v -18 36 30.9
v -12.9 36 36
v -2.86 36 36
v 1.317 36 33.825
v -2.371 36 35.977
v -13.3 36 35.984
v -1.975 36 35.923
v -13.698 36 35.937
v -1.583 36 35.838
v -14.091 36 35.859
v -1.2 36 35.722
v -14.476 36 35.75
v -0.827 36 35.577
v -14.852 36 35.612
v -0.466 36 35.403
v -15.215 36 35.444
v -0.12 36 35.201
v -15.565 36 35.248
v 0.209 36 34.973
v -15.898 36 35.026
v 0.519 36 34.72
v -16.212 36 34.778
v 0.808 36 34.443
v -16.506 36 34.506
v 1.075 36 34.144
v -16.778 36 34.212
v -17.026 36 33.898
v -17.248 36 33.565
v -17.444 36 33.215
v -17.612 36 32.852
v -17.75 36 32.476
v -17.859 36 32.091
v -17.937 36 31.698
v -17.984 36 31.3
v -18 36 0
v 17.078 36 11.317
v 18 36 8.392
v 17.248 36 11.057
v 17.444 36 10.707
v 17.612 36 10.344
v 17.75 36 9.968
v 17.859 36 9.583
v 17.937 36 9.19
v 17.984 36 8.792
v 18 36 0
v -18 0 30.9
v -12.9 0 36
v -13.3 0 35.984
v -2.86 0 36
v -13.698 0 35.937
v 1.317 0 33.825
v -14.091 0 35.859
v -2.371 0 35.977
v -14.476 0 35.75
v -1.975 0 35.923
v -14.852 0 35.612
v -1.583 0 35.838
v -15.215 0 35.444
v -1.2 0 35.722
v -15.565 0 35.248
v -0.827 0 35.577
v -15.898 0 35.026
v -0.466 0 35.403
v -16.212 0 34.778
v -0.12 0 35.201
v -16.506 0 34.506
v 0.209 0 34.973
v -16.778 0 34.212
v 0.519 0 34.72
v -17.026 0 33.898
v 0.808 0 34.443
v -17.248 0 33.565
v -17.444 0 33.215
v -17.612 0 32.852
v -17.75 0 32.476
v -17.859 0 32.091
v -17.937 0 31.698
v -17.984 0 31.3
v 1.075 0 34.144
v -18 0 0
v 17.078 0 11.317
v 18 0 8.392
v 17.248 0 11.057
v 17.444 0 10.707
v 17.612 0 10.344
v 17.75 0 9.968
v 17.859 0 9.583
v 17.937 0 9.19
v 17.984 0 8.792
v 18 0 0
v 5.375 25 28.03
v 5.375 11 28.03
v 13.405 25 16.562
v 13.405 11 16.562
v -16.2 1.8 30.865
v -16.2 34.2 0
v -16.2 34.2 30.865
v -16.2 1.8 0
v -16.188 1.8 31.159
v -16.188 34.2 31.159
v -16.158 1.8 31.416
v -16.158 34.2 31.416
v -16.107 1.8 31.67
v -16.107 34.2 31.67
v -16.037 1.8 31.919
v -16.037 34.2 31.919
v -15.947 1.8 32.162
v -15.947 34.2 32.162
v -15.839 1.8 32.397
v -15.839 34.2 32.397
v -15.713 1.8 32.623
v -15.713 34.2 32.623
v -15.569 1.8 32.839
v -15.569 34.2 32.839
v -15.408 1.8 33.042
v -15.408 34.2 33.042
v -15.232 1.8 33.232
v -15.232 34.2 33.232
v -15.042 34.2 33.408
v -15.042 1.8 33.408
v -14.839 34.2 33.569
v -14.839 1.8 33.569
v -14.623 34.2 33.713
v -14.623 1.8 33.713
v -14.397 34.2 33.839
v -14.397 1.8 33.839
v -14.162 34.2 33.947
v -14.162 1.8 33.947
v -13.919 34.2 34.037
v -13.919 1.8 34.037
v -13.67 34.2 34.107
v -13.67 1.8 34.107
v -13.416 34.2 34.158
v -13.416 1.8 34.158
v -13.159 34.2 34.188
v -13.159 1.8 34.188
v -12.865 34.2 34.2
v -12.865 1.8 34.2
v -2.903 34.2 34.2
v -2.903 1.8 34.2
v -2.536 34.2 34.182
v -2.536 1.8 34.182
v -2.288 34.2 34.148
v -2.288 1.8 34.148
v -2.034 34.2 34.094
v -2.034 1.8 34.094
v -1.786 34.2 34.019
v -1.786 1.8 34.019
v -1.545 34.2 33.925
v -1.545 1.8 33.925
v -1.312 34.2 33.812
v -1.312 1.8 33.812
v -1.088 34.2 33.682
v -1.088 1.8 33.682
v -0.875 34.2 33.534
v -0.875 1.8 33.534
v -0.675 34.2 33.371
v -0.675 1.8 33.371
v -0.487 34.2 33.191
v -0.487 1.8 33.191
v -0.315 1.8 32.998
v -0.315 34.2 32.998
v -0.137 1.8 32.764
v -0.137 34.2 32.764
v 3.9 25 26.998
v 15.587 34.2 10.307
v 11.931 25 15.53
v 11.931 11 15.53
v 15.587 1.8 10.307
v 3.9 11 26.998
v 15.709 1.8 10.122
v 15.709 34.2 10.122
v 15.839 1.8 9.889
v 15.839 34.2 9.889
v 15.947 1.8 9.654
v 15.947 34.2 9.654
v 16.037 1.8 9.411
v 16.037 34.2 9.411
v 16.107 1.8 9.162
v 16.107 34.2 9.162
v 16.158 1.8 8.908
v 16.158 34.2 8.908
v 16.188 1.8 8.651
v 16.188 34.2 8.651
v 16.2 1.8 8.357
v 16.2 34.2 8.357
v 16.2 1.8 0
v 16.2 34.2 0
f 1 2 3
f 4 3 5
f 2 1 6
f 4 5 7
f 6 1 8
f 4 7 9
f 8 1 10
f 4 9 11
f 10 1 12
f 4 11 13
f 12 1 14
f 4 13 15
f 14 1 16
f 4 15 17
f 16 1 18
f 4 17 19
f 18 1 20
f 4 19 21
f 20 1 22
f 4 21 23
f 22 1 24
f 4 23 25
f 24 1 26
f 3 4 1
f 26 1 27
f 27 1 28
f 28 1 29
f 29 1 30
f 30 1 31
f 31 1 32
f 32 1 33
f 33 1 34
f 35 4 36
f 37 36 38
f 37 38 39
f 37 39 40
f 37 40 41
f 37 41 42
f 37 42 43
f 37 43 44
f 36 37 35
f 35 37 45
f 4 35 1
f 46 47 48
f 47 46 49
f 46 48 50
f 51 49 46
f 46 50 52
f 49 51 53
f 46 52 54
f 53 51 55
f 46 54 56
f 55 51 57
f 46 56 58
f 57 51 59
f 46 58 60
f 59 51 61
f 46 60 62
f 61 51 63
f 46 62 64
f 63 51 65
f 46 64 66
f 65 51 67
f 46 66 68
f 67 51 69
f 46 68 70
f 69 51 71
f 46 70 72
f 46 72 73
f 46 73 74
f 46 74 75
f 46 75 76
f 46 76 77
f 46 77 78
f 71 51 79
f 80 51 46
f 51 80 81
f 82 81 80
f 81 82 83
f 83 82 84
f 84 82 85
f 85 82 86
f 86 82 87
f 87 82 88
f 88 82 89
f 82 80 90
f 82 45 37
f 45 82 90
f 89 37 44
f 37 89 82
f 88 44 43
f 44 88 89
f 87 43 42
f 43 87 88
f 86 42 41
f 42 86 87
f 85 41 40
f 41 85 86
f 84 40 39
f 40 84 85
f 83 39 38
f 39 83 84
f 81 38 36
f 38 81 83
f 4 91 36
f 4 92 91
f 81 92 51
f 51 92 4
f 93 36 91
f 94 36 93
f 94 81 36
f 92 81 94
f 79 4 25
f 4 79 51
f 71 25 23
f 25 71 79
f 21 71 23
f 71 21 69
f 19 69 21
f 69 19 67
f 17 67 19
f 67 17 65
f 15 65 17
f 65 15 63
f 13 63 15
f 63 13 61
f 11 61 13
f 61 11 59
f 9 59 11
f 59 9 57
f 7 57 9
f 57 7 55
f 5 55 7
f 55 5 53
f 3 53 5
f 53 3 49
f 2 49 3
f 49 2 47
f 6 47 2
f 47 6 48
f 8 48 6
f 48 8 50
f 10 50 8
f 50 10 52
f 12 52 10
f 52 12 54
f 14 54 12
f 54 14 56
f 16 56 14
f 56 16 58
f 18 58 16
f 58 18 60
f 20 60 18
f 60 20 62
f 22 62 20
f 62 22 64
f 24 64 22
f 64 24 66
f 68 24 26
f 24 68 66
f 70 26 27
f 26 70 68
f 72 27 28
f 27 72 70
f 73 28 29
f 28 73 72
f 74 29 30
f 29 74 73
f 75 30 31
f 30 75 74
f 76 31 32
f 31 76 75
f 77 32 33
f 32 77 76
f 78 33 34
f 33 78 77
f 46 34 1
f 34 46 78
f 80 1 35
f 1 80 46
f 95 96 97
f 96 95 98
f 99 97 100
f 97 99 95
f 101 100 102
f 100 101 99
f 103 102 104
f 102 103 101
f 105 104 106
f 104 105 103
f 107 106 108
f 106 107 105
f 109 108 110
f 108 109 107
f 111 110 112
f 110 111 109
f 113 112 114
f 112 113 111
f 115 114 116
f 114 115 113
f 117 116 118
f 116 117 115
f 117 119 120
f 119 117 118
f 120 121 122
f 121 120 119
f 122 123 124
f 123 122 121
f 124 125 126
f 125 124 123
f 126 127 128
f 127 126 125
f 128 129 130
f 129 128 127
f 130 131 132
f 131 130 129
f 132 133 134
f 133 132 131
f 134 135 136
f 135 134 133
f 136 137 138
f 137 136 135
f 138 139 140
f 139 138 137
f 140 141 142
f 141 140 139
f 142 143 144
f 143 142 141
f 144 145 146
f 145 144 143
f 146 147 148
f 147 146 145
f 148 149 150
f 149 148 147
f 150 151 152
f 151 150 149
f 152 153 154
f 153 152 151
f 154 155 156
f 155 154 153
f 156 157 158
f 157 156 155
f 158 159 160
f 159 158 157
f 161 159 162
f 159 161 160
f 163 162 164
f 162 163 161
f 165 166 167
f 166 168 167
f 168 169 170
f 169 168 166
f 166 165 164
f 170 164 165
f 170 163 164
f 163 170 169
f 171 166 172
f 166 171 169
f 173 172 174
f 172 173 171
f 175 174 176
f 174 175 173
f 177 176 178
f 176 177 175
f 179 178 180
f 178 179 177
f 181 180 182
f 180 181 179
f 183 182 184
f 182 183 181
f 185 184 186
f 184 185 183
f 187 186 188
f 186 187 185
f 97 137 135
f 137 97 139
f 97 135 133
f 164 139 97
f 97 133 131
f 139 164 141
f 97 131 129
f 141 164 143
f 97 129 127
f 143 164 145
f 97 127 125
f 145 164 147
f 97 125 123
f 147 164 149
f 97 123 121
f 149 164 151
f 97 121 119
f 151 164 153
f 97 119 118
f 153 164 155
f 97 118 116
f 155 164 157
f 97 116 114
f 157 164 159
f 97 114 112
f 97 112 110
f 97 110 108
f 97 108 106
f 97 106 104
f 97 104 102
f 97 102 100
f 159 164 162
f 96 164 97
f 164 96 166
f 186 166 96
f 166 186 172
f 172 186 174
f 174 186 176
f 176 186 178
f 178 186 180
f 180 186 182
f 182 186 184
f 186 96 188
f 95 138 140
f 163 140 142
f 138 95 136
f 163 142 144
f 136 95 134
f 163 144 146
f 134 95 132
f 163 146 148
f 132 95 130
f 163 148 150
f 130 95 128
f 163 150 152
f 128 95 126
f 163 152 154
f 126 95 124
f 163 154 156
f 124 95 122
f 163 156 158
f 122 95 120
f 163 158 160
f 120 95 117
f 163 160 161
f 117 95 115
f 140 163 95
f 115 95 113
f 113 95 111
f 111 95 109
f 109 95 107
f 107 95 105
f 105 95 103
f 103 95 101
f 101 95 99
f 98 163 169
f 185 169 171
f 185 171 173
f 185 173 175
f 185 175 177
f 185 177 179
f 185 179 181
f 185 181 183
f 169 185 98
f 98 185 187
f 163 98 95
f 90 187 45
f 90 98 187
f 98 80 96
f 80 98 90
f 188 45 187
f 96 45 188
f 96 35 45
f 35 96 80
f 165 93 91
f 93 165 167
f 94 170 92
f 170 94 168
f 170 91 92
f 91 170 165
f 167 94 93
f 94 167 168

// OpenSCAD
hole_dia=14;
square_hole=14;

// 1=round or 0=square 
hole_shape=1; // 1=square or 0=round 

size=36;//size of cube to house button
front_flat=10;
slope=35;
wall_thickness=1.8;
button_num=1;

dotext=0; // 1=yes or 0=no .... please note will take more time to render if yes

/*[Custom text for up to 4 buttons]*/
button_1_text="START";
button_2_text="SW-2";
button_3_text="SW-3";
button_4_text="SW-4";




button_text = [
   [0,  button_1_text],
   [1,  button_2_text],
   [2,  button_3_text],
   [3,  button_4_text],
    ];


 
module profile(){
round2d(5.1,0){
difference(){
translate([0,-10,0]) square([size,size+10]);
translate([size,front_flat,-0.2]) rotate([0,0,slope]) square(size+5,size);
}
}
}

$fn=80;
 

module round2d(OR,IR){
    offset(OR)offset(-IR-OR)offset(IR)children();
}

module side(){
linear_extrude(height=wall_thickness) profile();
}


module wall(){
    difference(){
     profile();
offset(r = -wall_thickness) profile();
    }
}

module boxy() {
linear_extrude(height=size) wall();
side();
translate([0,0,size-wall_thickness]) side();
}

module housing(){
render(convexity = 1){
difference(){
boxy();
translate([0,-size*3/2,0]) cube([size*3,size*3,size*3],true);
}}
}

module body_with_hole (){
     render(convexity = 1){
    difference(){
translate([0,size*sin(slope)-front_flat*cos(slope)-(size-front_flat)/cos(30)/2,-size/2]) rotate([0,0,-slope]) housing();
if (hole_shape==0) translate([size*cos(slope)-wall_thickness,0,0]) rotate([0,90,0]) cylinder(  15, d1=hole_dia,  d2=hole_dia,$fn=60);
if (hole_shape==1)  translate([size*cos(slope)+wall_thickness*3,0,0]) rotate([0,90,0])cube(size = [square_hole,square_hole,size/2], center = true);
     
        }
    
}

}


module turn_body_with_hole (){
    translate([-size/2,size/2,0])
  rotate([90,0,0]){  
ken=-(size*sin(slope)-front_flat*cos(slope)-(size-front_flat)/cos(30)/2);
echo (ken);
rotate([0,0,slope])
translate([0,ken,size/2]) body_with_hole();
  }
}



module all(){
for (a =[1:1:button_num])
translate([0,-size/2+wall_thickness,0])    
translate([0,a*size-(a*wall_thickness),0]) turn_body_with_hole ();
}




module button_name (){
for (a = button_text){
    translate([0,size*a[0]-(a[0]*wall_thickness),0]) 
    translate([size/2,size/2,front_flat*0.2]) 
    rotate([90,0,90])
    linear_extrude(height=20)
    text(text = str(a[1]),size=front_flat*0.5,halign="center");
}
}
render(convexity = 1){
difference(){
all();
if (dotext==1) translate([-wall_thickness/2,0,0]) button_name ();
     }
}
